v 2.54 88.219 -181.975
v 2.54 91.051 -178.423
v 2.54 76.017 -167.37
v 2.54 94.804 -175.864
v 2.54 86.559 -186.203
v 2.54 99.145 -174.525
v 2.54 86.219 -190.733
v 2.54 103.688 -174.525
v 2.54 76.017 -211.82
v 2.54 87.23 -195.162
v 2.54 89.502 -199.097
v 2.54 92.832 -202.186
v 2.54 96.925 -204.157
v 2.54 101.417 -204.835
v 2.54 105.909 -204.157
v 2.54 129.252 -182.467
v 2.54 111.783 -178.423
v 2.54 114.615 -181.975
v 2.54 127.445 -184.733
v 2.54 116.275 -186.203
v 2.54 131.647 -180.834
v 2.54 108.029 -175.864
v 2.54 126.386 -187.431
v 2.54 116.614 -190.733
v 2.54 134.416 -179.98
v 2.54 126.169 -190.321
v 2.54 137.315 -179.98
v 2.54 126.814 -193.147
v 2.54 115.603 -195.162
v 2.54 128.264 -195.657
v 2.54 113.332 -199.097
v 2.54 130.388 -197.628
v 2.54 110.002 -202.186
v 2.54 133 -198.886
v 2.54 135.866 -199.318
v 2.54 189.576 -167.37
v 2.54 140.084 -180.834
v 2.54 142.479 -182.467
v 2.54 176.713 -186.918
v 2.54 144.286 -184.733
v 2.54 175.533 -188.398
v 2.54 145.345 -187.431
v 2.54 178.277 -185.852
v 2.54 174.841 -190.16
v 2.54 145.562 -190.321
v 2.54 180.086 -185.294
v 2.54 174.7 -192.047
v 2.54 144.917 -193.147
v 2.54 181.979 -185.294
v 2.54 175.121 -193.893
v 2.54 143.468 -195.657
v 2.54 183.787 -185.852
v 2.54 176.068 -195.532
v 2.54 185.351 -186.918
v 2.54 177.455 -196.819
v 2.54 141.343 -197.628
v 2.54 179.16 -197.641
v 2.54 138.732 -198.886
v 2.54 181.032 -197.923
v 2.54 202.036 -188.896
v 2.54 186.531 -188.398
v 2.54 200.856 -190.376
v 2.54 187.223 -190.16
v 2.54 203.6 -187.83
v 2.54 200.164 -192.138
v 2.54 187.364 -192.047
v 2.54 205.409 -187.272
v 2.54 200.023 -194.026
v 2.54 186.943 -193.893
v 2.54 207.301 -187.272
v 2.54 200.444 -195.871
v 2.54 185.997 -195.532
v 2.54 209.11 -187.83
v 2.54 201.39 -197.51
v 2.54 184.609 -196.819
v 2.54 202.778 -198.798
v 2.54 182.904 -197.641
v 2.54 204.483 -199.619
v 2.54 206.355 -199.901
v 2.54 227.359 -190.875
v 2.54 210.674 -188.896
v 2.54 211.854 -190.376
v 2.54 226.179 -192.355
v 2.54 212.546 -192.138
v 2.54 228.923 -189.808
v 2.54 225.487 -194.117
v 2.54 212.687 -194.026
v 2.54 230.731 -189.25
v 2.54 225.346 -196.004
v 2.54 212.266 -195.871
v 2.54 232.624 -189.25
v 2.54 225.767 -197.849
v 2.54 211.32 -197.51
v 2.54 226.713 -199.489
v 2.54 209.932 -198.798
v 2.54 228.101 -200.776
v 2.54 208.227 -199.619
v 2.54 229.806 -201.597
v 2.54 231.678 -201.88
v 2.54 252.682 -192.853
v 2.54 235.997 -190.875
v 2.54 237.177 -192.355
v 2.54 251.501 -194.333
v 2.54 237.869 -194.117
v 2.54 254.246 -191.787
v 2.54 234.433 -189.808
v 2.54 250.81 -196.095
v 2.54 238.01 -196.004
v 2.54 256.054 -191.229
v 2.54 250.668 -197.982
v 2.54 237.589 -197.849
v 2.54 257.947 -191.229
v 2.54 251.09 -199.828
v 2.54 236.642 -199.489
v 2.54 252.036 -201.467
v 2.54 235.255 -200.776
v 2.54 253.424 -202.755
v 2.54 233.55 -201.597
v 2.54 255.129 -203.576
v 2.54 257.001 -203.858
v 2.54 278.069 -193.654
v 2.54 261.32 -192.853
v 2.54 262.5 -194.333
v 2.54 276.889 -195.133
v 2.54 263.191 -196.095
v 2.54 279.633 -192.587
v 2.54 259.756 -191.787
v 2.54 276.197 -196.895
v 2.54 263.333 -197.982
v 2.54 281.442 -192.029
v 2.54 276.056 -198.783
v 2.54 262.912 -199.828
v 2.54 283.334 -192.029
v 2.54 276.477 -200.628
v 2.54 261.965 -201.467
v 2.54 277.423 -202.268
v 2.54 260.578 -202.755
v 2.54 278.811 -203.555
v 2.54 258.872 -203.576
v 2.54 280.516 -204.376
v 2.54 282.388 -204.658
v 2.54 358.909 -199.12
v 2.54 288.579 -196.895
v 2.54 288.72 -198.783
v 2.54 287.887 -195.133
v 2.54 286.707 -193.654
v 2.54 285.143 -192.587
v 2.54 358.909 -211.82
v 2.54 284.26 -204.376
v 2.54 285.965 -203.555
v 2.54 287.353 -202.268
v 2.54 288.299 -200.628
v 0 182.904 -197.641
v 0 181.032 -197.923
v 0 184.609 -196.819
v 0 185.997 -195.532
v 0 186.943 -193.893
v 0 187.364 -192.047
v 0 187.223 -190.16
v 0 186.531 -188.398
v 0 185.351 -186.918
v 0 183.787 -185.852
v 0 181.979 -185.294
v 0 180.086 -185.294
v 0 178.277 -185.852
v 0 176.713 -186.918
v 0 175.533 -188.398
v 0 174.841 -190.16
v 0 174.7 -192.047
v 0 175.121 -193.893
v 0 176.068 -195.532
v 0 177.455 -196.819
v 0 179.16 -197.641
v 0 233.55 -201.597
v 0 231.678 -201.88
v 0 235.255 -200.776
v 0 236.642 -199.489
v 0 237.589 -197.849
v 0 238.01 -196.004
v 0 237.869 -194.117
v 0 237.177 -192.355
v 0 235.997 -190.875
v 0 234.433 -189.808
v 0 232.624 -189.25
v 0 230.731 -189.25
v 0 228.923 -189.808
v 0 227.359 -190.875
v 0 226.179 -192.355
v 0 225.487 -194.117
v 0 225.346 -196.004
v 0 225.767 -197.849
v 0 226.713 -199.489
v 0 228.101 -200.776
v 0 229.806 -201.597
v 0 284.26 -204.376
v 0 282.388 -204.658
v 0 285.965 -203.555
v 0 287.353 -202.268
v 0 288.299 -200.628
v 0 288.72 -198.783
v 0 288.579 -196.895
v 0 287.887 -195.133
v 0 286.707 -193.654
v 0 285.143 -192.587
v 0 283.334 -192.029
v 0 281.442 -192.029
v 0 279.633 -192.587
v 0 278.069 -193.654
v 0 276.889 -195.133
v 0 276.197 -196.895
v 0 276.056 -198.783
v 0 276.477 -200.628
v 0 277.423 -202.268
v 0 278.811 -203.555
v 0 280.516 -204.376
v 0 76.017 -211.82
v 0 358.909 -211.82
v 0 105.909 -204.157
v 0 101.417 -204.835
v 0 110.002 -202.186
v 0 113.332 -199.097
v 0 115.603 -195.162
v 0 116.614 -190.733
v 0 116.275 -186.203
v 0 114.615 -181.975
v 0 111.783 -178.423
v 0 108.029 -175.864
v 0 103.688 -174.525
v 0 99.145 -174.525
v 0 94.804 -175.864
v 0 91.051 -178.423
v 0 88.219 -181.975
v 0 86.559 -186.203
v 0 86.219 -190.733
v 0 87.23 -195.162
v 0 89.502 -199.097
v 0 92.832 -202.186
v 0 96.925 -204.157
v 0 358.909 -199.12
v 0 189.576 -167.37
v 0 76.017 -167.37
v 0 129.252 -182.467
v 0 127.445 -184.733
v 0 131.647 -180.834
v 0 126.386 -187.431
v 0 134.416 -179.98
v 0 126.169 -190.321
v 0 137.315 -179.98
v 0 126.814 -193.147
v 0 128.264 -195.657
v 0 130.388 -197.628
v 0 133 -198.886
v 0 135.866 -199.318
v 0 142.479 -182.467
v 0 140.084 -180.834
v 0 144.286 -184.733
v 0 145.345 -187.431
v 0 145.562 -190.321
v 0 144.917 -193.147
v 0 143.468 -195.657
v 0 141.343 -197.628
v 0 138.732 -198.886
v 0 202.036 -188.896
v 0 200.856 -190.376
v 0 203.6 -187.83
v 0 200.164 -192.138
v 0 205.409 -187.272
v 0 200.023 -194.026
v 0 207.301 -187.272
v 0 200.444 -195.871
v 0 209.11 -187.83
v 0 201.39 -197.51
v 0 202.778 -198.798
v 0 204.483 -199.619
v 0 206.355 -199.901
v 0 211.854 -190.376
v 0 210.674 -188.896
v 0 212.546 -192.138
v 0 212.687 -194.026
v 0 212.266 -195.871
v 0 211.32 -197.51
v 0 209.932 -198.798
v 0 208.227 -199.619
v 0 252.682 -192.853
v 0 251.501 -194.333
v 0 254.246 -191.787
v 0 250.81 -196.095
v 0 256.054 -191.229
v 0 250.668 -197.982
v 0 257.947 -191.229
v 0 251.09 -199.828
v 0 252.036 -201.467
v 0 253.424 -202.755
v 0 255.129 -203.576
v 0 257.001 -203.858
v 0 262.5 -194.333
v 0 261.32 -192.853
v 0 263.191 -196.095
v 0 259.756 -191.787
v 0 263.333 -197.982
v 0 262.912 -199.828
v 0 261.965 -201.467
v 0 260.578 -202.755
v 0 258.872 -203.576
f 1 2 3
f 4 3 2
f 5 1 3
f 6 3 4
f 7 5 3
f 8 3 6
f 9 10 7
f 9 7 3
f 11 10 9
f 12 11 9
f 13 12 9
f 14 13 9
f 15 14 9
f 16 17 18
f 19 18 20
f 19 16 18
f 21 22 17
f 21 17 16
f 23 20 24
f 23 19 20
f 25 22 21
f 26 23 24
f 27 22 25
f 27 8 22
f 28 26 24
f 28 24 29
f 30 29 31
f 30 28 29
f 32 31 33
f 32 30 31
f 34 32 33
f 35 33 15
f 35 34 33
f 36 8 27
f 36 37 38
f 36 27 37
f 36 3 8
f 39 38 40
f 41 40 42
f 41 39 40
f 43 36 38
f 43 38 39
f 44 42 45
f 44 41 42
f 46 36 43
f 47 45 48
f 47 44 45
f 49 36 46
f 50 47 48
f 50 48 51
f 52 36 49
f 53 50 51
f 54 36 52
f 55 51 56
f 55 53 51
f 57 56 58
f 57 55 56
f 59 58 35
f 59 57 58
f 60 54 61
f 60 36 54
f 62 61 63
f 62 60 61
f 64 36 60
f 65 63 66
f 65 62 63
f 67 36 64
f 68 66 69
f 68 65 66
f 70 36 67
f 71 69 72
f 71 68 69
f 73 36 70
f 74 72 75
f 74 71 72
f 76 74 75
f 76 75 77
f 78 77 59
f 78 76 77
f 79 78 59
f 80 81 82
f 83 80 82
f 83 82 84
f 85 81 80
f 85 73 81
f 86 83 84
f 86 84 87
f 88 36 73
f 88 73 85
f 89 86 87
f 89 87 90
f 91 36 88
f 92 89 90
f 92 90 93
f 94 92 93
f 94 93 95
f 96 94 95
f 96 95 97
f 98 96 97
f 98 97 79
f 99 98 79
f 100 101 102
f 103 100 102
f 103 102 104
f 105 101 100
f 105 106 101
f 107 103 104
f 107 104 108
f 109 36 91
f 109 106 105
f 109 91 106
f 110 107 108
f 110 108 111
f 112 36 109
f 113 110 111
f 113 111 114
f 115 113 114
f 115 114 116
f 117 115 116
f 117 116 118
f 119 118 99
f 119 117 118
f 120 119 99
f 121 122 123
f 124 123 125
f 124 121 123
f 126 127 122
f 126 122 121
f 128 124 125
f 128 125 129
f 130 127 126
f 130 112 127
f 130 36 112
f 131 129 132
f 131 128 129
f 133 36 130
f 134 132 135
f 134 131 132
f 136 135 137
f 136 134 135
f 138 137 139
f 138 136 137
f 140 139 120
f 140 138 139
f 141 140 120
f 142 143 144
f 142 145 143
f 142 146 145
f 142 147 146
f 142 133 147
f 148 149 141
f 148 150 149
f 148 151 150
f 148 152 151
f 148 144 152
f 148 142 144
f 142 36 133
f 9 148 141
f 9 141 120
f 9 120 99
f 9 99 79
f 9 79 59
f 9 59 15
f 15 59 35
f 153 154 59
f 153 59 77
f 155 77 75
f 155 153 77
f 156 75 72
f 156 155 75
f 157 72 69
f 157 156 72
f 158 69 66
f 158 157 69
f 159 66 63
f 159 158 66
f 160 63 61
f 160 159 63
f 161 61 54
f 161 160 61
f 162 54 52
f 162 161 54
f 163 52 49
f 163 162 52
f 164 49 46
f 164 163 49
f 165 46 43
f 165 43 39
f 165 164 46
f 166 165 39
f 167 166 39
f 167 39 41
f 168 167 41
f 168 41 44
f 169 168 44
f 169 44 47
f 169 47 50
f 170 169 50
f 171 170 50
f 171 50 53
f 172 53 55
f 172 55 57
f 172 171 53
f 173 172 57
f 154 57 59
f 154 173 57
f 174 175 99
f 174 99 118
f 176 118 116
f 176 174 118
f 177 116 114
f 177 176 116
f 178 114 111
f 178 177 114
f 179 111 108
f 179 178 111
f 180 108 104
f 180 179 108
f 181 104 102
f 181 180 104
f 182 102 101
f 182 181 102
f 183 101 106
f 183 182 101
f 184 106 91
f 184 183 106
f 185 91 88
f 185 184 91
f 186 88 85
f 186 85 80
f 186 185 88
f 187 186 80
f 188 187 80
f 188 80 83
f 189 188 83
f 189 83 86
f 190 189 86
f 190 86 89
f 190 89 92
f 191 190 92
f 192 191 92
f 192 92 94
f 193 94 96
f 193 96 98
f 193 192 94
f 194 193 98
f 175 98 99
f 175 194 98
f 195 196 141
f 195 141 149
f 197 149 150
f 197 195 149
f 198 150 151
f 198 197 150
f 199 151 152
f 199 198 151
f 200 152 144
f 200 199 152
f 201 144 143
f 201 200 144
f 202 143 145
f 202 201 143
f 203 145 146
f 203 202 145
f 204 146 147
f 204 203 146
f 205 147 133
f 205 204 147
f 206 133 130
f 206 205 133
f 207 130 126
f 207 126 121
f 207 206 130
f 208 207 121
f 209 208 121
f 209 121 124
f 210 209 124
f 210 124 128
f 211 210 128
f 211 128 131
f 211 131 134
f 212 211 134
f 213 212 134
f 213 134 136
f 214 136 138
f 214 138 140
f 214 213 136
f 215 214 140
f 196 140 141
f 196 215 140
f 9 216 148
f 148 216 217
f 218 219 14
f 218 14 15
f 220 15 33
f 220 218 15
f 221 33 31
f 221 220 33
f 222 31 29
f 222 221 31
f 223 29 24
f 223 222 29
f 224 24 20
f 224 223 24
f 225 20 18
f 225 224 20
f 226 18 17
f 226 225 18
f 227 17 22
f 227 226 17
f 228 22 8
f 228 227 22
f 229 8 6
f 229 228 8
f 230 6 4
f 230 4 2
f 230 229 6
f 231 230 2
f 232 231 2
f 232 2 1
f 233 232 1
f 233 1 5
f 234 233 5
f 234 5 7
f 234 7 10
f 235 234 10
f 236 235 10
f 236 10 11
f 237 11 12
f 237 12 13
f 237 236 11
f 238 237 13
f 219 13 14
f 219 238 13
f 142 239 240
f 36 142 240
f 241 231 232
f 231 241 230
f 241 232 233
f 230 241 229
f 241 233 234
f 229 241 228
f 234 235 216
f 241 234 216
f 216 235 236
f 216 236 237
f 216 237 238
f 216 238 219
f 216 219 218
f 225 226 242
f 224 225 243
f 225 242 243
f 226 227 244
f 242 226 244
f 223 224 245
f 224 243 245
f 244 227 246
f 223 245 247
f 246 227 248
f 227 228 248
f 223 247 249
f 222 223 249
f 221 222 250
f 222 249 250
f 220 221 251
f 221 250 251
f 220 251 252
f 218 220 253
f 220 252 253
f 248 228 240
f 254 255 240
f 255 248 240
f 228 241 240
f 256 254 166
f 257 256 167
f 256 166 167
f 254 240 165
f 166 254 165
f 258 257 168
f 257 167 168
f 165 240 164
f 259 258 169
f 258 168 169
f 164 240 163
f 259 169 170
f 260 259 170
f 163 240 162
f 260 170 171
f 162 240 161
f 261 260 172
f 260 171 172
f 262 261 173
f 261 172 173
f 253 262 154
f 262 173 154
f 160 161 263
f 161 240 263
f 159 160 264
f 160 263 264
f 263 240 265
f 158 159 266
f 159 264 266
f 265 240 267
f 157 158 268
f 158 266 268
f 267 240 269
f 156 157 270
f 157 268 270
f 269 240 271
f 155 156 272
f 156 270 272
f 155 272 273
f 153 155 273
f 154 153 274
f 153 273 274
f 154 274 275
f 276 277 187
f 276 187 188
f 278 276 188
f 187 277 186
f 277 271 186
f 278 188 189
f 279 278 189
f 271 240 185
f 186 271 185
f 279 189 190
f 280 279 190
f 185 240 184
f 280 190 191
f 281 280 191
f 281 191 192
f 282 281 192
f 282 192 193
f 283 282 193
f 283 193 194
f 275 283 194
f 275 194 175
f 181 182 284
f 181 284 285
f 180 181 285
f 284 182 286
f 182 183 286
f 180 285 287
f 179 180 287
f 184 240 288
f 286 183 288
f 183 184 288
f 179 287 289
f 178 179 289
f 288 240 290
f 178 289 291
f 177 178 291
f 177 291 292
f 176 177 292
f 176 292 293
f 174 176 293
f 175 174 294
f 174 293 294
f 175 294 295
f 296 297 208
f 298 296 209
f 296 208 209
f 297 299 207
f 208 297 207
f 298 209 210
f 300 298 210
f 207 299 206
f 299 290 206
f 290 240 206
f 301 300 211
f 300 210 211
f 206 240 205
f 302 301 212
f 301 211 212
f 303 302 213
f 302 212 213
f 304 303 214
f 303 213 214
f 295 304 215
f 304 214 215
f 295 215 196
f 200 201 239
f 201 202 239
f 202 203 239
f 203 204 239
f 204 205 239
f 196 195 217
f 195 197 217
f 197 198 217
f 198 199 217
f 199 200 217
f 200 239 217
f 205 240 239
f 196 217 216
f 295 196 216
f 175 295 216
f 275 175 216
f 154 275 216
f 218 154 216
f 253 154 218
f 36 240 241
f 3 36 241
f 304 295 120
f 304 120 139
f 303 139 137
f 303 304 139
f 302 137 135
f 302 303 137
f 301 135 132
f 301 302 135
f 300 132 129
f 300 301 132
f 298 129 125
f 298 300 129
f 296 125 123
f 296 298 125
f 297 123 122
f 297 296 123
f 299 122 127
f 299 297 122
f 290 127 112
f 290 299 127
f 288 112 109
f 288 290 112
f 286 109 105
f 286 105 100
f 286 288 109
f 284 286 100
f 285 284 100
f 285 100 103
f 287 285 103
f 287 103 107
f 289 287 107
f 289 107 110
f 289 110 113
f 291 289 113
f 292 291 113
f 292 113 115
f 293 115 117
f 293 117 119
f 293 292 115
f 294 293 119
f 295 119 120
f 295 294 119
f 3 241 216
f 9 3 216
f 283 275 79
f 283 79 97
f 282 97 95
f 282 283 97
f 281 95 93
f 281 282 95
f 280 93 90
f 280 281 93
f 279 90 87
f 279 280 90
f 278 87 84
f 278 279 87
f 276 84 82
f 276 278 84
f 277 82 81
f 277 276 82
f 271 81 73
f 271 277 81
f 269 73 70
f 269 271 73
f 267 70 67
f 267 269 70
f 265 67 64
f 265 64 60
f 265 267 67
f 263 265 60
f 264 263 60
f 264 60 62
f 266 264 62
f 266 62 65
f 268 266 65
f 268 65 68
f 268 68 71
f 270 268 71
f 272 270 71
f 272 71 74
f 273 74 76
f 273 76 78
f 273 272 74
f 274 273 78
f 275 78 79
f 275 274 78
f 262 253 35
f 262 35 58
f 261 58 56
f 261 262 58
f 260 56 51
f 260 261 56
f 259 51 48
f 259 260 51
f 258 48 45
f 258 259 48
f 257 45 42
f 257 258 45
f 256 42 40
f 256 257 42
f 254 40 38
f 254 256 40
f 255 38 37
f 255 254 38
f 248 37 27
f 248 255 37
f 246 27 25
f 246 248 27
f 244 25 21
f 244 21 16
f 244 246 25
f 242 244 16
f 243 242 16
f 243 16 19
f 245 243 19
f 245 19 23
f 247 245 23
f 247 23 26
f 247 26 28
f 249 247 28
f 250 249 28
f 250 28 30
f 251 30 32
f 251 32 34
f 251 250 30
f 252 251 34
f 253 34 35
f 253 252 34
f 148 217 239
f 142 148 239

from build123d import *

# Parameters (mm, degrees)
SKETCH1_R           = 9.7234375
SKETCH1_R_2         = 15.24
SKETCH1_R_3         = 6.35
BOSS_EXTRUDE1_DEPTH = 2.54


with BuildPart() as part:
    # Sketch1 → Boss-Extrude1 (new body)
    with BuildSketch(Plane(origin=(0, 0, 0), x_dir=(0, 0, -1), z_dir=(1, 0, 0))):
        Polygon((199.119533938, 358.909346267), (167.369533938, 189.576012933), (167.369533938, 76.016846267), (211.819533938, 76.016846267), (211.819533938, 308.109346267), (211.819533938, 358.909346267), align=None)
        with Locations((189.594533938, 135.865596267)):
            Circle(SKETCH1_R, mode=Mode.SUBTRACT)
        with Locations((189.594533938, 101.416846267)):
            Circle(SKETCH1_R_2, mode=Mode.SUBTRACT)
        with Locations((191.572880687, 181.032184657)):
            Circle(SKETCH1_R_3, mode=Mode.SUBTRACT)
        with Locations((193.551227437, 206.355023047)):
            Circle(SKETCH1_R_3, mode=Mode.SUBTRACT)
        with Locations((195.529574186, 231.677861438)):
            Circle(SKETCH1_R_3, mode=Mode.SUBTRACT)
        with Locations((197.507920935, 257.000699828)):
            Circle(SKETCH1_R_3, mode=Mode.SUBTRACT)
        with Locations((198.308463246, 282.388081182)):
            Circle(SKETCH1_R_3, mode=Mode.SUBTRACT)
    extrude(amount=BOSS_EXTRUDE1_DEPTH)


solid = part.part
